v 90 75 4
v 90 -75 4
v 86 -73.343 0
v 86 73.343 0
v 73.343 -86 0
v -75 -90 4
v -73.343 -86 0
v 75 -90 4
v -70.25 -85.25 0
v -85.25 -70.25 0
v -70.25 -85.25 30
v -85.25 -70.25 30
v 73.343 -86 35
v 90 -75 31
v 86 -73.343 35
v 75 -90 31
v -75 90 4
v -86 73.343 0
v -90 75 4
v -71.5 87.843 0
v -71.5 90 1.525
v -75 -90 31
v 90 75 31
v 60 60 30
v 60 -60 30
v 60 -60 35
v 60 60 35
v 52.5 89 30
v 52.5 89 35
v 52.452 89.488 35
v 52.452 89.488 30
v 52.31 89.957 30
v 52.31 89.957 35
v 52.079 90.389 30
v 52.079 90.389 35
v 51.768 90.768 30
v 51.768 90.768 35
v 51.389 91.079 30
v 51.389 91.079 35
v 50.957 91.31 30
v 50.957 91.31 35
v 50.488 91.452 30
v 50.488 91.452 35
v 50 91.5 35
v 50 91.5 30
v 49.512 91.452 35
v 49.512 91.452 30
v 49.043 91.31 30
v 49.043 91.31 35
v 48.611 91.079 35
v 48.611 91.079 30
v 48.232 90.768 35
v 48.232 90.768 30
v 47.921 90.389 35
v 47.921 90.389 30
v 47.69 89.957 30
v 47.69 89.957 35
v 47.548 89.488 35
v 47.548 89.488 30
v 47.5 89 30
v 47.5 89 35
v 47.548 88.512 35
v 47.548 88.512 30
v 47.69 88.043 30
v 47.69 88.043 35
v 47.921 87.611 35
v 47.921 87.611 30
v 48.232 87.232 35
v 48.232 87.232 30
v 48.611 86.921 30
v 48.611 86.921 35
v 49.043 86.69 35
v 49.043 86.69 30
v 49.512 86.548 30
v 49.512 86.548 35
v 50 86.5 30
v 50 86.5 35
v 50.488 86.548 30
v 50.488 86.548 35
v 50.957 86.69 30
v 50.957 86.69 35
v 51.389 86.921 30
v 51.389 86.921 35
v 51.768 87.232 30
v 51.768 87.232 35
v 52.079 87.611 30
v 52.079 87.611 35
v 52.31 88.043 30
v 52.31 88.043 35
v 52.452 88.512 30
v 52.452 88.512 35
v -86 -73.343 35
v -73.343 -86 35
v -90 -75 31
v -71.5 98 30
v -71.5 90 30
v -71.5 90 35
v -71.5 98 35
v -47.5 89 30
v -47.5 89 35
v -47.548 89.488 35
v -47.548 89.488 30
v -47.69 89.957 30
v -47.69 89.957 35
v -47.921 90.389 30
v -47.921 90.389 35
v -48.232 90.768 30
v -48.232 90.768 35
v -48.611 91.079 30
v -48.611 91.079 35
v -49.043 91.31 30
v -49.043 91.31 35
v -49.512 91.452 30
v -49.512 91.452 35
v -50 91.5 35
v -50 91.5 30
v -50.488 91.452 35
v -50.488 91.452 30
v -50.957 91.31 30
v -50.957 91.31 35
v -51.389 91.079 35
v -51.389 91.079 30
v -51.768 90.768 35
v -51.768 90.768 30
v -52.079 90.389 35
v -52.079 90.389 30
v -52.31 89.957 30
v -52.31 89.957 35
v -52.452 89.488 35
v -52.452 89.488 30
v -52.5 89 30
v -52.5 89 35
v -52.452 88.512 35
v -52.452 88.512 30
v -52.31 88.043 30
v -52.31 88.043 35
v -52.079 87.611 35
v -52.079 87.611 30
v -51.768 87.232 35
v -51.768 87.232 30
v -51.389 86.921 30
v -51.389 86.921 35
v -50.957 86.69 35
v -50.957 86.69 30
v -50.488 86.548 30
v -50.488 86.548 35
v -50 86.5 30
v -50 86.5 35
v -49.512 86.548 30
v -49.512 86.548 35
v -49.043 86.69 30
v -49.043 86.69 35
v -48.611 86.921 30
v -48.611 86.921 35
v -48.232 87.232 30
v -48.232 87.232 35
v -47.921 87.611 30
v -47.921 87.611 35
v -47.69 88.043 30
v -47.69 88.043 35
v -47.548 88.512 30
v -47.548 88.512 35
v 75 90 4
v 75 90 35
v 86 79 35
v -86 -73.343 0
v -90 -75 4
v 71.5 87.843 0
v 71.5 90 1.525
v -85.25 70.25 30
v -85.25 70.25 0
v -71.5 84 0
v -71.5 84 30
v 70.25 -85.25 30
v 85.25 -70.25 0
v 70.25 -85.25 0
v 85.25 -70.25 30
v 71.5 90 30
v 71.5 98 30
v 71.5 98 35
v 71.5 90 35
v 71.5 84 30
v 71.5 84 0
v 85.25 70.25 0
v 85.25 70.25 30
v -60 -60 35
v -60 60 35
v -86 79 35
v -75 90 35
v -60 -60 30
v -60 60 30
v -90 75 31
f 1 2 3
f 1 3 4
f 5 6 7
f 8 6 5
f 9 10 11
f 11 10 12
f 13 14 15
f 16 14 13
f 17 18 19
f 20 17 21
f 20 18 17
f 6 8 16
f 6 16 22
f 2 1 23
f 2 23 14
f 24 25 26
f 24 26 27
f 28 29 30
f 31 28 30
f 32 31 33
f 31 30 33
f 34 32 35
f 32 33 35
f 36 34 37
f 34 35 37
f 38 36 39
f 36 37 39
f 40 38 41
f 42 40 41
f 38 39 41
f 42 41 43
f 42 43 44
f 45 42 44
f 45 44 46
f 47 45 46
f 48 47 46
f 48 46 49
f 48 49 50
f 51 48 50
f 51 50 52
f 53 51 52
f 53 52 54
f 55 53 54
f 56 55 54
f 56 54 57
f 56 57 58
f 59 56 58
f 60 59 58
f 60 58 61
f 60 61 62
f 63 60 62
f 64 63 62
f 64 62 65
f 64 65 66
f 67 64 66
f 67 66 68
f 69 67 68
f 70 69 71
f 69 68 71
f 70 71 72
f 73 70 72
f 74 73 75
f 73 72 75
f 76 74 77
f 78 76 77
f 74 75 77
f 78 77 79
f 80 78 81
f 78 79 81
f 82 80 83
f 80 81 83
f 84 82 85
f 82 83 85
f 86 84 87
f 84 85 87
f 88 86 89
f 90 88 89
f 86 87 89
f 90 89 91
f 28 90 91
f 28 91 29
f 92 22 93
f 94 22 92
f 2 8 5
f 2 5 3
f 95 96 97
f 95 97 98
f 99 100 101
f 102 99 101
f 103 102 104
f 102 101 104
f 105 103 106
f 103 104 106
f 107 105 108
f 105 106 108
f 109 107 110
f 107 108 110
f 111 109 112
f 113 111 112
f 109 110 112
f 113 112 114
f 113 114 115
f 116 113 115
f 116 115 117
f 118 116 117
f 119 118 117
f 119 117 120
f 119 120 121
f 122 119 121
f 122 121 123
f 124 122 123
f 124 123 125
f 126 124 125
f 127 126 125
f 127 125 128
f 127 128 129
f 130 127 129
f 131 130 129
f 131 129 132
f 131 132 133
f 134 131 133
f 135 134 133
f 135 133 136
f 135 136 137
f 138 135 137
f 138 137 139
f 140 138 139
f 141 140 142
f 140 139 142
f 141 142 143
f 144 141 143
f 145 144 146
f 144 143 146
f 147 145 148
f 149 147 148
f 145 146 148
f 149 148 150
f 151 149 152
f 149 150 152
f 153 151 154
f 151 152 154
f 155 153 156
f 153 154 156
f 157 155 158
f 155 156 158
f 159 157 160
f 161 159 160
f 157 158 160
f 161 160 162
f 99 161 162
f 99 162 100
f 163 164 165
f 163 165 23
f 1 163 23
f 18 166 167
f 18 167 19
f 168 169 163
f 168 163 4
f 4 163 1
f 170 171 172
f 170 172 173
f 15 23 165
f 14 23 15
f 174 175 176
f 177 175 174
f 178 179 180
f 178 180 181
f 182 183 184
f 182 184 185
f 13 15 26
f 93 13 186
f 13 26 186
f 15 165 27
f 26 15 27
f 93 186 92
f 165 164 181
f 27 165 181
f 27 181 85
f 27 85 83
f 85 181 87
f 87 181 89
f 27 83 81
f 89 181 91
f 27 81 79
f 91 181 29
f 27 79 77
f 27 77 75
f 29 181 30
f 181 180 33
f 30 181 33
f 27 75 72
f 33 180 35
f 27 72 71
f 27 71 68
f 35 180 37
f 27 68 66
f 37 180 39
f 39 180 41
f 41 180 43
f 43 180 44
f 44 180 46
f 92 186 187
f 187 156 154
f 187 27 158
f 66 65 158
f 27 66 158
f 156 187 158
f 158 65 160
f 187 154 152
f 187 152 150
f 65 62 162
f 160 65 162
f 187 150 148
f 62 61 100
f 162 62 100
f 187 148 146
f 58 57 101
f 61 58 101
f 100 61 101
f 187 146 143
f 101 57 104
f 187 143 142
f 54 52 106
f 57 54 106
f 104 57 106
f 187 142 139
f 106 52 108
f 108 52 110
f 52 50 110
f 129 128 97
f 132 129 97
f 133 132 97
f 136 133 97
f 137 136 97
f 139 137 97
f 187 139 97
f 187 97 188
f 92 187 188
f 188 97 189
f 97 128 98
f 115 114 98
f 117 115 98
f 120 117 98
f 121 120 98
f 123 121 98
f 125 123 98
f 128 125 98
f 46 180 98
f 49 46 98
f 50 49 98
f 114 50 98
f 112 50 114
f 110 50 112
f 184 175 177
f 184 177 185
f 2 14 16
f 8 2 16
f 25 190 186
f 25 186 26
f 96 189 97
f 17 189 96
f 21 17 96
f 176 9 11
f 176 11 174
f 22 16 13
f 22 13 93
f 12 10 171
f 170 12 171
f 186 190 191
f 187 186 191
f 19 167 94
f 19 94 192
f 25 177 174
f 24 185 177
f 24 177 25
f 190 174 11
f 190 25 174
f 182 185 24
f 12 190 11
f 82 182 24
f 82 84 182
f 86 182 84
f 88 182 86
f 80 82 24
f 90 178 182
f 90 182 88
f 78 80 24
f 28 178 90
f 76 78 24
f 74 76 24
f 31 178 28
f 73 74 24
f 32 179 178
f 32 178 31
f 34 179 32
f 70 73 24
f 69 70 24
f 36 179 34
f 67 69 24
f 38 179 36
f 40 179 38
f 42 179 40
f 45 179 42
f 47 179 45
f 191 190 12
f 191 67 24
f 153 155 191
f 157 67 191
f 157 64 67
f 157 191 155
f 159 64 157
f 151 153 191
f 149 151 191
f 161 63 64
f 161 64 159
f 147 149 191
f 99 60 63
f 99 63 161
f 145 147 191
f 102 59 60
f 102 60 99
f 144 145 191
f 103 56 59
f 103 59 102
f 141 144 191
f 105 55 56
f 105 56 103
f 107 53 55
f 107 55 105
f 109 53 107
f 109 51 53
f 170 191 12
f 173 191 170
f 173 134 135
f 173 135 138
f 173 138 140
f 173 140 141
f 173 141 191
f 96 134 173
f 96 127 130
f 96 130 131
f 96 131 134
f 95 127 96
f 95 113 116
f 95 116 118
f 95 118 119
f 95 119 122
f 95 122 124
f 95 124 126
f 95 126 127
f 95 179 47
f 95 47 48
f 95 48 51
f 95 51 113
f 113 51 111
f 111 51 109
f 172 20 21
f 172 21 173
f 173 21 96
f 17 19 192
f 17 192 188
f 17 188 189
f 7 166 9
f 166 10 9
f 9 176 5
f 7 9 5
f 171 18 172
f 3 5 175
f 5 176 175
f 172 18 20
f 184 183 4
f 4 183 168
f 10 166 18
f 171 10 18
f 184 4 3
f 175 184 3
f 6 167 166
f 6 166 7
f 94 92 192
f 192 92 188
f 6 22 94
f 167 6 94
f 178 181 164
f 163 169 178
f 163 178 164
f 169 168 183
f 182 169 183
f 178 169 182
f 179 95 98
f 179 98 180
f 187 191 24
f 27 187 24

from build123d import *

# Parameters (mm, degrees)
SKETCH_W        = 180
SKETCH_H        = 180
SKETCH_W_2      = 170.5
SKETCH_H_2      = 170.5
PAD_DEPTH       = 30
CHAMFER_SIZE    = 15
SKETCH001_W     = 120
SKETCH001_H     = 120
PAD001_DEPTH    = 5
SKETCH002_W     = 143
SKETCH002_H     = 30
POCKET_DEPTH    = 10
SKETCH003_R     = 2.5
POCKET001_DEPTH = 35.001
CHAMFER001_SIZE = 4
CHAMFER002_SIZE = 4


with BuildPart() as part:
    # Sketch → Pad (new body)
    with BuildSketch(Plane.XY):
        Rectangle(SKETCH_W, SKETCH_H)
        Rectangle(SKETCH_W_2, SKETCH_H_2, mode=Mode.SUBTRACT)
    extrude(amount=PAD_DEPTH)

    # Chamfer
    chamfer_edges = [part.edges().sort_by_distance(p)[0] for p in [
        (-90, -90, 15),
        (-85.25, -85.25, 15),
        (-85.25, 85.25, 15),
        (-90, 90, 15),
        (85.25, 85.25, 15),
        (90, 90, 15),
        (85.25, -85.25, 15),
        (90, -90, 15),
    ]]
    chamfer(chamfer_edges, length=CHAMFER_SIZE)

    # Sketch001 (on Face5 of Chamfer) → Pad001 (join)
    with BuildSketch(Plane.XY.offset(30)):
        Polygon((-90, -75), (-90, 75), (-75, 90), (-71.5, 90), (-71.5, 98), (71.5, 98), (71.5, 90), (75, 90), (90, 75), (90, -75), (75, -90), (-75, -90), align=None)
        Rectangle(SKETCH001_W, SKETCH001_H, mode=Mode.SUBTRACT)
    extrude(amount=PAD001_DEPTH)

    # Sketch002 (on Face24 of Pad001) → Pocket (cut)
    with BuildSketch(Plane(origin=(0, 90, 0), x_dir=(-1, 0, 0), z_dir=(0, 1, 0))):
        with Locations((0, 15)):
            Rectangle(SKETCH002_W, SKETCH002_H)
    extrude(amount=-POCKET_DEPTH, mode=Mode.SUBTRACT)

    # Sketch003 (on Face20 of Pocket) → Pocket001 (cut, through all)
    with BuildSketch(Plane.XY.offset(35)):
        with Locations((-50, 89)):
            Circle(SKETCH003_R)
        with Locations((50, 89)):
            Circle(SKETCH003_R)
    extrude(amount=-POCKET001_DEPTH, mode=Mode.SUBTRACT)

    # Chamfer001
    chamfer001_edges = [part.edges().sort_by_distance(p)[0] for p in [
        (90, 0, 35),
        (82.5, -82.5, 35),
        (0, -90, 35),
        (-82.5, -82.5, 35),
        (-90, 0, 35),
    ]]
    chamfer(chamfer001_edges, length=CHAMFER001_SIZE)

    # Chamfer002
    chamfer002_edges = [part.edges().sort_by_distance(p)[0] for p in [
        (82.5, 82.5, 0),
        (90, 0, 0),
        (82.5, -82.5, 0),
        (0, -90, 0),
        (-82.5, -82.5, 0),
        (-90, 0, 0),
        (-82.5, 82.5, 0),
    ]]
    chamfer(chamfer002_edges, length=CHAMFER002_SIZE)


solid = part.part
